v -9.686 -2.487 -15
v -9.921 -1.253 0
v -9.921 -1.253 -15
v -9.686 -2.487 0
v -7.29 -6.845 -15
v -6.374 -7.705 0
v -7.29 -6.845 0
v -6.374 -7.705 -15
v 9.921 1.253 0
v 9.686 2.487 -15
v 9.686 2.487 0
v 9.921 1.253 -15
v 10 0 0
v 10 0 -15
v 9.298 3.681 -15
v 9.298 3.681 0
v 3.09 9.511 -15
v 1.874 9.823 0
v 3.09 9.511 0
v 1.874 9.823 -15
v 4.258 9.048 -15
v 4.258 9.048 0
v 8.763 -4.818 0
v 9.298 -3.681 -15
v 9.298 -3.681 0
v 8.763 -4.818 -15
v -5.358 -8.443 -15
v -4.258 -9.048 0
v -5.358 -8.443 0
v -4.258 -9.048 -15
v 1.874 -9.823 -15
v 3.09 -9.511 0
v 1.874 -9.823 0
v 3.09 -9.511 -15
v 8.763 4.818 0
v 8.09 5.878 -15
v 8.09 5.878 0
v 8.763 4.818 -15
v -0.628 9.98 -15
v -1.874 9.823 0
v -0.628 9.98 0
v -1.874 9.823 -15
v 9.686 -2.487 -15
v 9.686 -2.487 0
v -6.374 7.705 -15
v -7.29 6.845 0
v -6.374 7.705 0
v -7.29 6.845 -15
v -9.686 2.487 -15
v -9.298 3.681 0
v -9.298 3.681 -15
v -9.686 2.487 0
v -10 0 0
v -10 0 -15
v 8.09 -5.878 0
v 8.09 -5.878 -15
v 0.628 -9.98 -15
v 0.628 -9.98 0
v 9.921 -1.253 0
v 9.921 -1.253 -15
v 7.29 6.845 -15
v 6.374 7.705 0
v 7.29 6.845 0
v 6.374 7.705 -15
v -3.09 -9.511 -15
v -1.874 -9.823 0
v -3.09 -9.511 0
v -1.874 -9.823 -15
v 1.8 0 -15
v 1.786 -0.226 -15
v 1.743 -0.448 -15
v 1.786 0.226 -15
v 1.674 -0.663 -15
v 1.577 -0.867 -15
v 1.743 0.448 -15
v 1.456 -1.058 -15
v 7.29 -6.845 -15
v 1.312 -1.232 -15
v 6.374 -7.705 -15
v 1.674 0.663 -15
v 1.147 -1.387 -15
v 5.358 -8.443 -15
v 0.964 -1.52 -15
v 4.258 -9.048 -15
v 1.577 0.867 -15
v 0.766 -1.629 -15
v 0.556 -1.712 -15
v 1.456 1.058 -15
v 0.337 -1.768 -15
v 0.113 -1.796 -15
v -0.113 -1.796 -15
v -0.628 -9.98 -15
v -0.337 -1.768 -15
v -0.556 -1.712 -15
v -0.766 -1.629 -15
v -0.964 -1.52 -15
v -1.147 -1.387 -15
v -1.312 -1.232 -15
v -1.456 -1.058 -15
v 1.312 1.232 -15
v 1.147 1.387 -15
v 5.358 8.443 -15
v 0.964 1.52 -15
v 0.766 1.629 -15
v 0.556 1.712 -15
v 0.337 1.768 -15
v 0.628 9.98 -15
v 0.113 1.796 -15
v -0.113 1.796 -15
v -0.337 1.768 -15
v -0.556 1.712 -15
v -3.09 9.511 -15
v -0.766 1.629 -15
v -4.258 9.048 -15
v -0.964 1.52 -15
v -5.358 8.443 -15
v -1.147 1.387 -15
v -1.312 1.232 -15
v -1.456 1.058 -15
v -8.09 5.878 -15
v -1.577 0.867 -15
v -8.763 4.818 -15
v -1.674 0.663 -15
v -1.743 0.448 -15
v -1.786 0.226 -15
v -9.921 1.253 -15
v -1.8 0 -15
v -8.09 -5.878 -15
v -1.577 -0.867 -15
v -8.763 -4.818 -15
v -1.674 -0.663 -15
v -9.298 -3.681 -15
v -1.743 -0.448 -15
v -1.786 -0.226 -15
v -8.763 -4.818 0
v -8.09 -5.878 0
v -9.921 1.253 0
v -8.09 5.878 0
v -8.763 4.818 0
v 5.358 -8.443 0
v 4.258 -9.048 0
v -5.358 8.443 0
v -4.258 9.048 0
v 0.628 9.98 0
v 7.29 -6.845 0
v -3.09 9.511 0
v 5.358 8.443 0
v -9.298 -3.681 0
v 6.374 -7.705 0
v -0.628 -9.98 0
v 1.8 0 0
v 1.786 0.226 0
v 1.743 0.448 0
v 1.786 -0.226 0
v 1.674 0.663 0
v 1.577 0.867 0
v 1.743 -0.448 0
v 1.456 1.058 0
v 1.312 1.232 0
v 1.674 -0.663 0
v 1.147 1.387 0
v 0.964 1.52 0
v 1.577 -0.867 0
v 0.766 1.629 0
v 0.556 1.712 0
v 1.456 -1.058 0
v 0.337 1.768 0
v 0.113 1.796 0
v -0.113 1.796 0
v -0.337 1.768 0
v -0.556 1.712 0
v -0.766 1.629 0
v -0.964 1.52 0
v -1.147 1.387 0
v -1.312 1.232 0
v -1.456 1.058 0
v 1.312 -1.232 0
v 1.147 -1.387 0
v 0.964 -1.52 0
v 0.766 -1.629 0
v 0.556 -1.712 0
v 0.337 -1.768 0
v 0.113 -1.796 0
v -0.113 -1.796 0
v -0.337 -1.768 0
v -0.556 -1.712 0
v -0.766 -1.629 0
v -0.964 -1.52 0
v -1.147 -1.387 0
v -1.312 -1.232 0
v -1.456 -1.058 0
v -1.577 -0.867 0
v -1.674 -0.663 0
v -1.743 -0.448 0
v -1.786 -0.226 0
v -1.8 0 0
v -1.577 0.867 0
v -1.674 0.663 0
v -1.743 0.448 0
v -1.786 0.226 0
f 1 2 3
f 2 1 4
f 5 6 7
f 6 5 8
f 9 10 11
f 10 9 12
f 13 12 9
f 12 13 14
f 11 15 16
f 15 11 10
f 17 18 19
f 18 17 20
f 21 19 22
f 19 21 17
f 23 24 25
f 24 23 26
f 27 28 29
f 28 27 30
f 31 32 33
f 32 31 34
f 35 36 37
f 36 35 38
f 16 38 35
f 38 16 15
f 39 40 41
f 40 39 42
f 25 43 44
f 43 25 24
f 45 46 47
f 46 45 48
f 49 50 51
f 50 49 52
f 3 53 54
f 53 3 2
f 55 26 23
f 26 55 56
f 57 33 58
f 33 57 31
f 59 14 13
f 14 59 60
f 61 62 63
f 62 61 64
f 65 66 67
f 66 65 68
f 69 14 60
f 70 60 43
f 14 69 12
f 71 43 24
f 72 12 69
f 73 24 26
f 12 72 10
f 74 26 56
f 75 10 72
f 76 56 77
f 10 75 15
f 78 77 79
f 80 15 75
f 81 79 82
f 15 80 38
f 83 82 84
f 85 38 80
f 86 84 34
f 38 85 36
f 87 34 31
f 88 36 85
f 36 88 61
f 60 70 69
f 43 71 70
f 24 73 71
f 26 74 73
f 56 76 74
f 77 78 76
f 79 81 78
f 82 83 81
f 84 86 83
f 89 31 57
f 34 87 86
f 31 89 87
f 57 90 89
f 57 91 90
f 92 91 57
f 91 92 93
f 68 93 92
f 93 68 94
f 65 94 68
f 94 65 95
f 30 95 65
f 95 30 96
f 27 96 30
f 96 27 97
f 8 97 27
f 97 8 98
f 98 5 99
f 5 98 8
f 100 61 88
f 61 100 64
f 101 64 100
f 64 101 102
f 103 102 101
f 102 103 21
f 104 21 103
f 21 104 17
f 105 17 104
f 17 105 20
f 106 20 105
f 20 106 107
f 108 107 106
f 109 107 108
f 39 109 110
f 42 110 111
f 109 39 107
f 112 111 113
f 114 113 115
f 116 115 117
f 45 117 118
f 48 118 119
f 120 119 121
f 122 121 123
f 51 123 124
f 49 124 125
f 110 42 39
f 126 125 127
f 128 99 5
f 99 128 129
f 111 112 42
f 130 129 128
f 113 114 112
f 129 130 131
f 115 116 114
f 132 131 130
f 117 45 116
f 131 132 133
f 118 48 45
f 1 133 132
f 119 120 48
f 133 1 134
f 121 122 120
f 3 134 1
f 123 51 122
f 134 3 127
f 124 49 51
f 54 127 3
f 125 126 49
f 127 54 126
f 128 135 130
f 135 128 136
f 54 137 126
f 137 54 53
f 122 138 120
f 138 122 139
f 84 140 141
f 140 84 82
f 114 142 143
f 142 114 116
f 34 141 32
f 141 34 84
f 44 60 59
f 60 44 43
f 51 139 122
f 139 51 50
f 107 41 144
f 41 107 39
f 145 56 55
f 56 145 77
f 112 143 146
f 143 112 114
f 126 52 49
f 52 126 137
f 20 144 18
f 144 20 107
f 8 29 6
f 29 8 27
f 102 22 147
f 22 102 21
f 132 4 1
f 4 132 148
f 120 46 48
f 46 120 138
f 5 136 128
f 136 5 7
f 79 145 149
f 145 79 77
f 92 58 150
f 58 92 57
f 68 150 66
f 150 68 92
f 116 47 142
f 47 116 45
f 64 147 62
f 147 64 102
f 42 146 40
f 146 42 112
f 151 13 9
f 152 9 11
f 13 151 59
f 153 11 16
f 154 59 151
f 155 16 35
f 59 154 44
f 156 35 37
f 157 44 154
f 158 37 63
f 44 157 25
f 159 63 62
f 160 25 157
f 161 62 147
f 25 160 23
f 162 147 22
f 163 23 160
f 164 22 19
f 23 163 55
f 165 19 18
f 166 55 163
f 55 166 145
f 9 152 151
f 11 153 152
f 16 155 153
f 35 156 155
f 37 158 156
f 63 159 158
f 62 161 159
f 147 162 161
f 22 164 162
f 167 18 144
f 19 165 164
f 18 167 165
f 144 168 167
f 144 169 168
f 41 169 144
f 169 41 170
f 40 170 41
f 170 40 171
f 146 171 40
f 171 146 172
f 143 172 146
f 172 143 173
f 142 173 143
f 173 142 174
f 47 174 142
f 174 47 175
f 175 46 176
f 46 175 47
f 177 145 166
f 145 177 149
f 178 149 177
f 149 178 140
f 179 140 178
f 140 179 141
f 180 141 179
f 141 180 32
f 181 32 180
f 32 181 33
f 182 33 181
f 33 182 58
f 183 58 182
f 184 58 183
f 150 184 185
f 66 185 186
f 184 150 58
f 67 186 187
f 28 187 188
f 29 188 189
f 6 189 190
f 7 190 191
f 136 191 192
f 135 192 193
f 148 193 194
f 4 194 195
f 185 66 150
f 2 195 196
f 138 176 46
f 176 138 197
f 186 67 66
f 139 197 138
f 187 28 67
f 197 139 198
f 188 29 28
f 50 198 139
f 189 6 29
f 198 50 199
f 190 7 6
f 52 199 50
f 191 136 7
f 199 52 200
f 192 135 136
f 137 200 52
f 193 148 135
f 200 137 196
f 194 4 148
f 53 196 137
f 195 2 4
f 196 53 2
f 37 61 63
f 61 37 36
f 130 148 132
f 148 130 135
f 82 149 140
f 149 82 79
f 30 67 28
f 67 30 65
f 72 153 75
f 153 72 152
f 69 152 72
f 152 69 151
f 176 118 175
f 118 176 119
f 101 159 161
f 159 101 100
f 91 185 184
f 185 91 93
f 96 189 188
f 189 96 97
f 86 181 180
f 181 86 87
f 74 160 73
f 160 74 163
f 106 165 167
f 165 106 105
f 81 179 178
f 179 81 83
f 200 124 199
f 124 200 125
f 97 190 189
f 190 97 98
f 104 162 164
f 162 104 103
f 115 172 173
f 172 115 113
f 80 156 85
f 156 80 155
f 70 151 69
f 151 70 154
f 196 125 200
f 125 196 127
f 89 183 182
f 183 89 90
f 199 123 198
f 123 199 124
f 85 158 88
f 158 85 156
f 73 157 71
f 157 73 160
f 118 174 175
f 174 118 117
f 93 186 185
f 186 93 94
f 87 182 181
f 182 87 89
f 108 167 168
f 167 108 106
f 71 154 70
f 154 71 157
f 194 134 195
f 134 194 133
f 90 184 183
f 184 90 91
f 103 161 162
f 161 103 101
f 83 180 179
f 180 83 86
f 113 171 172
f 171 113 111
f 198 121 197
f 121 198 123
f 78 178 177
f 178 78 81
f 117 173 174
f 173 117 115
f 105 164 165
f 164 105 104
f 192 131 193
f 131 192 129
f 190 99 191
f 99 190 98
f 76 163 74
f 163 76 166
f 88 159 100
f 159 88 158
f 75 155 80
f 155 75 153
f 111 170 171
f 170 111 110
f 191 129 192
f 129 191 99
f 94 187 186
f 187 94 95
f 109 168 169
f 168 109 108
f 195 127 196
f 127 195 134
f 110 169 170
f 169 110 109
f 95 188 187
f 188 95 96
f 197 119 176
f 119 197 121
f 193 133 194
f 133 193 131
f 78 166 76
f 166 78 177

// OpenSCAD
$fn = 50;


difference() {
	union() {
		translate(v = [0, 0, -15.0000000000]) {
			cylinder(h = 15, r = 10.0000000000);
		}
		cylinder(h = 0, r = 16.0000000000);
	}
	union() {
		#translate(v = [0, 0, -15]) {
			cylinder(h = 15, r = 1.8000000000);
		}
	}
}
